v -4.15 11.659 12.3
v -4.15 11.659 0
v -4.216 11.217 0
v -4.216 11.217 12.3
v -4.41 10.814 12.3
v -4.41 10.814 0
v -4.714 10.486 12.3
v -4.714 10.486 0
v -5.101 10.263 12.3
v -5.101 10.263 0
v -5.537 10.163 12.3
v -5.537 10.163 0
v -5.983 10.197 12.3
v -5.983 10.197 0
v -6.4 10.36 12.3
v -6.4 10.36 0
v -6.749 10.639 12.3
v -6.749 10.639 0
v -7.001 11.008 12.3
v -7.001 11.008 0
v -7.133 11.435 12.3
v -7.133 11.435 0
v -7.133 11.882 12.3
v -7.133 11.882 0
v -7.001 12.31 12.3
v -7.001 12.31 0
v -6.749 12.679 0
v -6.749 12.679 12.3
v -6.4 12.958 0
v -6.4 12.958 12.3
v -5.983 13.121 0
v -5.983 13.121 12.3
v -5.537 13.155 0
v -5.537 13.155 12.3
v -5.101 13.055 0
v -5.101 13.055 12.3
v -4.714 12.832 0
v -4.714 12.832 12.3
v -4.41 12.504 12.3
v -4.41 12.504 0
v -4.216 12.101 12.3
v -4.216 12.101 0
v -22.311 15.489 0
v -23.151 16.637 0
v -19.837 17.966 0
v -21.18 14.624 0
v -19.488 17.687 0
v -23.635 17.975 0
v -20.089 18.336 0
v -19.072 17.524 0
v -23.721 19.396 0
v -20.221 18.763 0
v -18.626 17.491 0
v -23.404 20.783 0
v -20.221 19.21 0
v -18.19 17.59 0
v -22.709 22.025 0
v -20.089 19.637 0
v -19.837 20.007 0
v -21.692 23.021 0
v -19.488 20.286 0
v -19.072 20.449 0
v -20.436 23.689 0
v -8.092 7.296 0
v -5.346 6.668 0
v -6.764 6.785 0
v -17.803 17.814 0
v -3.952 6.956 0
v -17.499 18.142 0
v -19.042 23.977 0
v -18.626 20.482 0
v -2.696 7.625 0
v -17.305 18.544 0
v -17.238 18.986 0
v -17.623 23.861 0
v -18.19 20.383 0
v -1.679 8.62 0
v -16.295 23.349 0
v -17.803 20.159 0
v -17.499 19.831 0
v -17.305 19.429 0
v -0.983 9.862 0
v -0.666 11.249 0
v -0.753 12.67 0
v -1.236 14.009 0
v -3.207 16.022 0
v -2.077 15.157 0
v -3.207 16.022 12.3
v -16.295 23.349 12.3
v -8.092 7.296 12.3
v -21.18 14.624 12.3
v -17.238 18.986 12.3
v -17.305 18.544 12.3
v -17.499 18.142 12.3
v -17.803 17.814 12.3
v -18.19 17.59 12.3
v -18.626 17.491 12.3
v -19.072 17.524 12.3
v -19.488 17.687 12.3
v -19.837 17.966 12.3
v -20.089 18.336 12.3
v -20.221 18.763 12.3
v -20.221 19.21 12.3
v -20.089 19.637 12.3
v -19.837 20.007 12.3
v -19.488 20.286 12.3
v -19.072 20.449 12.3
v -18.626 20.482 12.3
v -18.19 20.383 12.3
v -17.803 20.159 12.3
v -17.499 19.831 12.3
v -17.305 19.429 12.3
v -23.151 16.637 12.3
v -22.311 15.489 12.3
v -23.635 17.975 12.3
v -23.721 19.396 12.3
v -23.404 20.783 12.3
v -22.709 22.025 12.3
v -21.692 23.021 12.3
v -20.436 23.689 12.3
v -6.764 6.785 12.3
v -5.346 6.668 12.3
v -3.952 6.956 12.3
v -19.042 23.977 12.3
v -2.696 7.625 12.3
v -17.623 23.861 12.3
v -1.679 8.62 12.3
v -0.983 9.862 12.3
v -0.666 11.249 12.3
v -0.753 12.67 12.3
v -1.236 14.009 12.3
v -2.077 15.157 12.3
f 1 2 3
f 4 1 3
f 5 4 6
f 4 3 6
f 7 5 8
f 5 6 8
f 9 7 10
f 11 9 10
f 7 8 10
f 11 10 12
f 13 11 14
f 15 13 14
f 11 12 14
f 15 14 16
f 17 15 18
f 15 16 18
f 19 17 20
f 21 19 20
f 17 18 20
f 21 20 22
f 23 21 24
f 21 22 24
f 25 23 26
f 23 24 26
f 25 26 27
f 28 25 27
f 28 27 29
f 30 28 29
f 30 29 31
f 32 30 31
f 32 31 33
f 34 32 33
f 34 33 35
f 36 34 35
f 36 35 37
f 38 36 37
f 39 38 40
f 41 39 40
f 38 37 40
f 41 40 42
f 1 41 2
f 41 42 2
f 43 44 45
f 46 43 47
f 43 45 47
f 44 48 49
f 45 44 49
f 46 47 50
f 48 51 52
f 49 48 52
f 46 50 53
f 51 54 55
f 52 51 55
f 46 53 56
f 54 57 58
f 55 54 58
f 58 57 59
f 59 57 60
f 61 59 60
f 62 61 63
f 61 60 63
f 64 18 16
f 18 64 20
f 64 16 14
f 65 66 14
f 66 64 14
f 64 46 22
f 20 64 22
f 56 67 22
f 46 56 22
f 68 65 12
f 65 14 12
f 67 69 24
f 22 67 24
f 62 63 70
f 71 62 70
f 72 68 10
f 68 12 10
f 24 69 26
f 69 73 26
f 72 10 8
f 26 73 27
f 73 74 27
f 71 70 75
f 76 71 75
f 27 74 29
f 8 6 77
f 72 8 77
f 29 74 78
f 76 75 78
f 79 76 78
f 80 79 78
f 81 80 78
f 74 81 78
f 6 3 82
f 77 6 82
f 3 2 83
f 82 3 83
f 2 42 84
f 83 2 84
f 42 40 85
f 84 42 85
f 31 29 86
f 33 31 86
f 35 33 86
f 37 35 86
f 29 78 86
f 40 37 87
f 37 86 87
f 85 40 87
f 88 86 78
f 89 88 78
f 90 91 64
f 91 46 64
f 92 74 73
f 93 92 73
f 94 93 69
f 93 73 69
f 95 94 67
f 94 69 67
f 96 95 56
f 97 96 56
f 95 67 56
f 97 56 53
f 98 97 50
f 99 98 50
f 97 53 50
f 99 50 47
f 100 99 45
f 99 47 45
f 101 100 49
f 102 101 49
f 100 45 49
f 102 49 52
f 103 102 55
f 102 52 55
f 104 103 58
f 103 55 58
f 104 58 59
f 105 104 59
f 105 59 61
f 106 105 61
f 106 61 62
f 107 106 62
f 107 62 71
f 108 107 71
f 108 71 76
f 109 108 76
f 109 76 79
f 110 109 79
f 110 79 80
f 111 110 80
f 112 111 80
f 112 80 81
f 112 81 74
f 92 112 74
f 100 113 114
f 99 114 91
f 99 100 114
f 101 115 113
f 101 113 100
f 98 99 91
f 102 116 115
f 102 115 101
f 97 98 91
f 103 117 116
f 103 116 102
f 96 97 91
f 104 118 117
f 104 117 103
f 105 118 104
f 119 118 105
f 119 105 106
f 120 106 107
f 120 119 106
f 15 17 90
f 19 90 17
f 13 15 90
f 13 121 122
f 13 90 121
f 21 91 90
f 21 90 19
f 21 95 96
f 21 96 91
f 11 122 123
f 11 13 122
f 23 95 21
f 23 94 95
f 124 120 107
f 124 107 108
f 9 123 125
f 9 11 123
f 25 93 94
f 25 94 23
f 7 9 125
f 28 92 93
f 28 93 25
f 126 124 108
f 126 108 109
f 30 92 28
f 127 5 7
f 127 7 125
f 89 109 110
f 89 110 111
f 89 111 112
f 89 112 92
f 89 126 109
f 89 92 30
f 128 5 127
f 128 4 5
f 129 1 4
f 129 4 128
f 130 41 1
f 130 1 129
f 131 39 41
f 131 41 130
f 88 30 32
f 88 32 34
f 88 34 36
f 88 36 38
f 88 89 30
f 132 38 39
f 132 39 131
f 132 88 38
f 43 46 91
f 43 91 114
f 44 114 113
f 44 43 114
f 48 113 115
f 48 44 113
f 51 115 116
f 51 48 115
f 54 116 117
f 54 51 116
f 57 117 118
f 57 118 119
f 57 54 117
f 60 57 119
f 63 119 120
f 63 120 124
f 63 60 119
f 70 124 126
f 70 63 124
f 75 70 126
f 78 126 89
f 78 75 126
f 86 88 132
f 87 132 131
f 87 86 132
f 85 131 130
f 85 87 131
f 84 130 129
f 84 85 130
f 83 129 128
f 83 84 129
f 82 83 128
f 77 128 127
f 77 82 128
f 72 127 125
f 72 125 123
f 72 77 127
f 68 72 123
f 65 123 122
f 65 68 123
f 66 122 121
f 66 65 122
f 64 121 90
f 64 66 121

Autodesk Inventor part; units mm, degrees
ref_plane "YZ Plane" through (0, 0, 0) normal (1, 0, 0) x (0, 1, 0)
ref_plane "XZ Plane" through (0, 0, 0) normal (0, 1, 0) x (-1, 0, 0)
sketch "Sketch1" plane through (0, 0, 0) normal (0, 0, 1) x (1, 0, 0)
  line L0 (86.516, -0.3214) -> (114.7595, -23.8164) projected
  arc A0 (113.4805, -27.354) -> (114.7595, -23.8164) centre (113.4805, -25.354) ccw projected
  line L1 (113.4805, -27.354) -> (84.3159, -27.354) projected
  arc A1 (80.4978, -22.1613) -> (84.3159, -27.354) centre (84.3159, -23.354) ccw projected
  arc A2 (80.4978, -22.1613) -> (83.238, -1.9261) centre (22.2724, -3.9734) ccw projected
  arc A3 (86.516, -0.3214) -> (83.238, -1.9261) centre (85.2369, -1.8589) ccw projected
  arc A4 (123.464, -37.945) -> (119.4703, -38.0751) centre (121.4642, -37.9192) ccw projected
  arc A5 (144.0129, -57.1973) -> (123.464, -37.945) centre (122.1805, -59.9075) ccw projected
  arc A6 (144.143, -61.191) -> (144.0129, -57.1973) centre (144.1688, -59.1912) ccw projected
  arc A7 (124.8907, -81.7399) -> (144.143, -61.191) centre (122.1805, -59.9075) ccw projected
  arc A8 (120.8969, -81.87) -> (124.8907, -81.7399) centre (122.8968, -81.8958) ccw projected
  arc A9 (100.3481, -62.6177) -> (120.8969, -81.87) centre (122.1805, -59.9075) ccw projected
  arc A10 (100.218, -58.6239) -> (100.3481, -62.6177) centre (100.1921, -60.6238) ccw projected
  arc A11 (119.4703, -38.0751) -> (100.218, -58.6239) centre (122.1805, -59.9075) ccw projected
  arc A12 (87.2274, -61.7195) -> (88.373, -68.9659) centre (122.1805, -59.9075) ccw projected
  arc A13 (85.8324, -71.3887) -> (88.373, -68.9659) centre (86.4412, -69.4836) ccw projected
  line L2 (85.8324, -71.3887) -> (52.5887, -60.766) projected
  arc A14 (52.2157, -57.1184) -> (52.5887, -60.766) centre (53.1975, -58.8609) ccw projected
  arc A15 (52.2157, -57.1184) -> (67.1926, -45.2429) centre (22.2724, -3.9734) ccw projected
  arc A16 (72.896, -45.0519) -> (67.1926, -45.2429) centre (70.1382, -47.9491) ccw projected
  line L3 (72.896, -45.0519) -> (84.7539, -56.3391) projected
  arc A17 (87.2274, -61.7195) -> (84.7539, -56.3391) centre (79.2381, -62.1337) ccw projected
  circle A18 centre (-5.6495, 11.6589) radius 2.05 projected
  circle A19 centre (-18.7379, 18.9865) radius 2.05 projected
  line L4 (2.166, 24.8708) -> (-5.7638, 34.6785) projected
  arc A20 (-5.0374, 39.0984) -> (-5.7638, 34.6785) centre (-3.431, 36.5647) ccw projected
  arc A21 (4.796, 43.9388) -> (-5.0374, 39.0984) centre (22.2724, -3.9734) ccw projected
  arc A22 (8.7012, 41.9703) -> (4.796, 43.9388) centre (5.8241, 41.1205) ccw projected
  line L5 (8.7012, 41.9703) -> (12.2517, 29.9506) projected
  arc A23 (10.4645, 26.3057) -> (12.2517, 29.9506) centre (9.3746, 29.1007) ccw projected
  arc A24 (10.4645, 26.3057) -> (6.0009, 24.16) centre (22.2724, -3.9734) ccw projected
  arc A25 (2.166, 24.8708) -> (6.0009, 24.16) centre (4.4989, 26.757) ccw projected
  line L6 (21.3733, 31.3882) -> (21.0547, 43.9173) projected
  arc A26 (24.1651, 46.9915) -> (21.0547, 43.9173) centre (24.0537, 43.9936) ccw projected
  arc A27 (35.0106, 45.4102) -> (24.1651, 46.9915) centre (22.2724, -3.9734) ccw projected
  arc A28 (37.0613, 41.4281) -> (35.0106, 45.4102) centre (34.2613, 42.5053) ccw projected
  line L7 (37.0613, 41.4281) -> (32.5324, 29.6567) projected
  arc A29 (29.1021, 27.8009) -> (32.5324, 29.6567) centre (29.7325, 30.7339) ccw projected
  arc A30 (29.1021, 27.8009) -> (24.1948, 28.4697) centre (22.2724, -3.9734) ccw projected
  arc A31 (21.3733, 31.3882) -> (24.1948, 28.4697) centre (24.3723, 31.4645) ccw projected
  line L8 (37.199, 27.8613) -> (41.7278, 39.6327) projected
  arc A32 (45.9187, 41.2135) -> (41.7278, 39.6327) centre (44.5277, 38.5555) ccw projected
  arc A33 (55.0274, 35.1177) -> (45.9187, 41.2135) centre (22.2724, -3.9734) ccw projected
  arc A34 (55.2752, 30.7515) -> (55.0274, 35.1177) centre (53.1006, 32.8182) ccw projected
  line L9 (55.2752, 30.7515) -> (46.641, 21.6668) projected
  arc A35 (42.5909, 21.3921) -> (46.641, 21.6668) centre (44.4665, 23.7336) ccw projected
  arc A36 (42.5909, 21.3921) -> (38.5009, 24.1849) centre (22.2724, -3.9734) ccw projected
  arc A37 (37.199, 27.8613) -> (38.5009, 24.1849) centre (39.9989, 26.7841) ccw projected
  line L10 (52.4469, 14.4861) -> (59.2911, 18.6731) projected
  arc A38 (63.5177, 17.4994) -> (59.2911, 18.6731) centre (60.8567, 16.114) ccw projected
  arc A39 (66.9215, 9.0155) -> (63.5177, 17.4994) centre (22.2724, -3.9734) ccw projected
  arc A40 (64.5079, 5.2141) -> (66.9215, 9.0155) centre (64.0409, 8.1775) ccw projected
  line L11 (64.5079, 5.2141) -> (56.5269, 3.9563) projected
  arc A41 (53.2046, 5.9991) -> (56.5269, 3.9563) centre (56.0599, 6.9197) ccw projected
  arc A42 (53.2046, 5.9991) -> (51.3302, 10.5833) centre (22.2724, -3.9734) ccw projected
  arc A43 (52.4469, 14.4861) -> (51.3302, 10.5833) centre (54.0124, 11.927) ccw projected
  line L12 (57.3053, -0.9828) -> (65.2864, 0.2751) projected
  arc A44 (68.7521, -2.5997) -> (65.2864, 0.2751) centre (65.7534, -2.6883) ccw projected
  arc A45 (68.1227, -11.7192) -> (68.7521, -2.5997) centre (22.2724, -3.9734) ccw projected
  arc A46 (64.4621, -14.1361) -> (68.1227, -11.7192) centre (65.1646, -11.2195) ccw projected
  line L13 (64.4621, -14.1361) -> (56.6618, -12.2571) projected
  arc A47 (54.3988, -8.887) -> (56.6618, -12.2571) centre (57.3643, -9.3405) ccw projected
  arc A48 (54.3988, -8.887) -> (54.7724, -3.9485) centre (22.2724, -3.9734) ccw projected
  arc A49 (57.3053, -0.9828) -> (54.7724, -3.9485) centre (57.7724, -3.9462) ccw projected
  line L14 (53.346, -20.8755) -> (64.3558, -26.8641) projected
  arc A50 (65.463, -31.0949) -> (64.3558, -26.8641) centre (62.9223, -29.4995) ccw projected
  arc A51 (58.6707, -39.6968) -> (65.463, -31.0949) centre (22.2724, -3.9734) ccw projected
  arc A52 (54.1968, -39.4816) -> (58.6707, -39.6968) centre (56.5296, -37.5954) ccw projected
  line L15 (54.1968, -39.4816) -> (46.2669, -29.6738) projected
  arc A53 (46.3749, -25.7752) -> (46.2669, -29.6738) centre (48.5998, -27.7876) ccw projected
  arc A54 (46.3749, -25.7752) -> (49.4077, -21.8598) centre (22.2724, -3.9734) ccw projected
  arc A55 (53.346, -20.8755) -> (49.4077, -21.8598) centre (51.9125, -23.5108) ccw projected
  line L16 (42.3788, -32.8175) -> (50.3087, -42.6252) projected
  arc A56 (49.5823, -47.0451) -> (50.3087, -42.6252) centre (47.9758, -44.5114) ccw projected
  arc A57 (39.7488, -51.8855) -> (49.5823, -47.0451) centre (22.2724, -3.9734) ccw projected
  arc A58 (35.8437, -49.917) -> (39.7488, -51.8855) centre (38.7208, -49.0672) ccw projected
  line L17 (35.8437, -49.917) -> (32.2932, -37.8973) projected
  arc A59 (34.0803, -34.2525) -> (32.2932, -37.8973) centre (35.1703, -37.0474) ccw projected
  arc A60 (34.0803, -34.2525) -> (38.5439, -32.1067) centre (22.2724, -3.9734) ccw projected
  arc A61 (42.3788, -32.8175) -> (38.5439, -32.1067) centre (40.0459, -34.7037) ccw projected
  line L18 (23.1715, -39.3349) -> (23.3755, -47.3558) projected
  arc A62 (20.2457, -50.4292) -> (23.3755, -47.3558) centre (20.3765, -47.432) ccw projected
  arc A63 (11.1966, -49.135) -> (20.2457, -50.4292) centre (22.2724, -3.9734) ccw projected
  arc A64 (9.1112, -45.1441) -> (11.1966, -49.135) centre (11.9112, -46.2214) ccw projected
  line L19 (9.1112, -45.1441) -> (12.0124, -37.6034) projected
  arc A65 (15.4428, -35.7477) -> (12.0124, -37.6034) centre (14.8123, -38.6807) ccw projected
  arc A66 (15.4428, -35.7477) -> (20.35, -36.4165) centre (22.2724, -3.9734) ccw projected
  arc A67 (23.1715, -39.3349) -> (20.35, -36.4165) centre (20.1725, -39.4112) ccw projected
  line L20 (7.3459, -35.8081) -> (4.4447, -43.3488) projected
  arc A68 (0.2222, -44.9128) -> (4.4447, -43.3488) centre (1.6448, -42.2715) ccw projected
  arc A69 (-7.3609, -39.808) -> (0.2222, -44.9128) centre (22.2724, -3.9734) ccw projected
  arc A70 (-7.6236, -35.4294) -> (-7.3609, -39.808) centre (-5.449, -37.4961) ccw projected
  line L21 (-7.6236, -35.4294) -> (-2.0962, -29.6136) projected
  arc A71 (1.9539, -29.3388) -> (-2.0962, -29.6136) centre (0.0783, -31.6803) ccw projected
  arc A72 (1.9539, -29.3388) -> (6.0439, -32.1316) centre (22.2724, -3.9734) ccw projected
  arc A73 (7.3459, -35.8081) -> (6.0439, -32.1316) centre (4.5459, -34.7308) ccw projected
  line L22 (-7.9021, -22.4328) -> (-18.5933, -28.9733) projected
  arc A74 (-22.8108, -27.8167) -> (-18.5933, -28.9733) centre (-20.1588, -26.4142) ccw projected
  arc A75 (-26.8641, -17.6335) -> (-22.8108, -27.8167) centre (22.2724, -3.9734) ccw projected
  arc A76 (-24.4408, -13.8666) -> (-26.8641, -17.6335) centre (-23.9738, -16.83) ccw projected
  line L23 (-24.4408, -13.8666) -> (-11.9821, -11.903) projected
  arc A77 (-8.6598, -13.9459) -> (-11.9821, -11.903) centre (-11.515, -14.8664) ccw projected
  arc A78 (-8.6598, -13.9459) -> (-6.7854, -18.53) centre (22.2724, -3.9734) ccw projected
  arc A79 (-7.9021, -22.4328) -> (-6.7854, -18.53) centre (-9.4676, -19.8737) ccw projected
  line L24 (-12.7605, -6.9639) -> (-25.2192, -8.9275) projected
  arc A80 (-28.6837, -6.0885) -> (-25.2192, -8.9275) centre (-25.6863, -5.9641) ccw projected
  arc A81 (-27.9589, 4.8477) -> (-28.6837, -6.0885) centre (22.2724, -3.9734) ccw projected
  arc A82 (-24.3016, 7.2454) -> (-27.9589, 4.8477) centre (-25.0042, 4.3289) ccw projected
  line L25 (-24.3016, 7.2454) -> (-12.117, 4.3104) projected
  arc A83 (-9.854, 0.9403) -> (-12.117, 4.3104) centre (-12.8195, 1.3938) ccw projected
  arc A84 (-9.854, 0.9403) -> (-10.2276, -3.9982) centre (22.2724, -3.9734) ccw projected
  arc A85 (-12.7605, -6.9639) -> (-10.2276, -3.9982) centre (-13.2276, -4.0005) ccw projected
  circle A86 centre (85.7696, -48.6911) radius 2.05 projected
  circle A87 centre (93.5857, -34.7301) radius 2.05 projected
  circle A88 centre (76.5892, -34.383) radius 2.05 projected
  circle A89 centre (151.7223, -75.704) radius 1.5 projected
  circle A90 centre (150.6316, -42.2218) radius 1.5 projected
  circle A91 centre (123.2712, -93.3897) radius 1.5 projected
  circle A92 centre (123.1684, -22.4726) radius 2 projected
  circle A93 centre (91.7471, -81.3441) radius 2 projected
  circle A94 centre (110.6431, -14.2192) radius 2 projected
  circle A95 centre (78.0027, -75.3364) radius 2 projected
  arc A96 (-41.3146, 7.2953) -> (-36.3695, 11.8712) centre (-78.5082, 52.4493) ccw projected
  arc A97 (-32.9898, 9.9939) -> (-36.3695, 11.8712) centre (-34.9289, 10.4839) ccw projected
  arc A98 (-32.9898, 9.9939) -> (-34.2864, 3.1052) centre (22.2724, -3.9734) ccw projected
  arc A99 (-37.576, 1.8381) -> (-34.2864, 3.1052) centre (-36.2709, 3.3536) ccw projected
  arc A100 (-37.576, 1.8381) -> (-40.8614, 3.9267) centre (-46.3856, -8.3913) ccw projected
  arc A101 (-41.3146, 7.2953) -> (-40.8614, 3.9267) centre (-40.043, 5.7516) ccw projected
  arc A102 (-33.319, -18.6649) -> (-28.8077, -30.3754) centre (22.2724, -3.9734) ccw projected
  arc A103 (-31.7455, -32.9222) -> (-28.8077, -30.3754) centre (-30.5844, -31.2938) ccw projected
  line L26 (-31.7455, -32.9222) -> (-43.0588, -24.8558) projected
  arc A104 (-42.4768, -21.313) -> (-43.0588, -24.8558) centre (-41.8977, -23.2274) ccw projected
  arc A105 (-42.4768, -21.313) -> (-36.6892, -17.7843) centre (-46.3856, -8.3913) ccw projected
  arc A106 (-33.319, -18.6649) -> (-36.6892, -17.7843) centre (-35.2527, -19.1759) ccw projected
  line L27 (-64.993, -11.6723) -> (-61.5225, -11.0604) projected
  arc A107 (-59.2669, -12.4314) -> (-61.5225, -11.0604) centre (-61.1752, -13.03) ccw projected
  arc A108 (-59.2669, -12.4314) -> (-52.6012, -20.3753) centre (-46.3856, -8.3913) ccw projected
  arc A109 (-51.6426, -22.8348) -> (-52.6012, -20.3753) centre (-53.522, -22.1507) ccw projected
  line L28 (-51.6426, -22.8348) -> (-52.8479, -26.1463) projected
  arc A110 (-55.6053, -27.2592) -> (-52.8479, -26.1463) centre (-54.7273, -25.4622) ccw projected
  arc A111 (-66.5678, -14.1946) -> (-55.6053, -27.2592) centre (-46.3856, -8.3913) ccw projected
  arc A112 (-64.993, -11.6723) -> (-66.5678, -14.1946) centre (-64.6457, -13.6419) ccw projected
  circle A113 centre (-48.56, 6.9152) radius 2.1 projected
  circle A114 centre (-32.9741, 22.501) radius 2.1 projected
  circle A115 centre (-69.0444, -1.2227) radius 2.1 projected
  circle A116 centre (-24.8362, 42.9855) radius 2.1 projected
  circle A117 centre (-46.3856, -8.3913) radius 8 projected
  line L29 (-28.6687, 48.4472) -> (-17.4995, 54.7179) projected
  arc A118 (-69.8258, 3.2089) -> (-28.6687, 48.4472) centre (-78.5082, 52.4493) ccw projected
  line L30 (-69.8258, 3.2089) -> (-78.128, 1.745) projected
  line L31 (-78.128, 1.745) -> (-74.0482, -21.3924) projected
  line L32 (-74.0482, -21.3924) -> (-71.8042, -20.9967) projected
  arc A119 (-69.7278, -21.9611) -> (-71.8042, -20.9967) centre (-71.4569, -22.9663) ccw projected
  arc A120 (-69.7278, -21.9611) -> (-51.1536, -34.967) centre (-46.3856, -8.3913) ccw projected
  arc A121 (-49.5371, -36.5883) -> (-51.1536, -34.967) centre (-51.5067, -36.9355) ccw projected
  line L33 (-49.5371, -36.5883) -> (-49.1414, -38.8323) projected
  line L34 (-49.1414, -38.8323) -> (-41.7759, -37.5336) projected
  arc A122 (-40.7711, -37.6143) -> (-41.7759, -37.5336) centre (-41.4286, -39.5032) ccw projected
  line L35 (-40.7711, -37.6143) -> (2.4006, -52.6404) projected
  arc A123 (3.6226, -55.2133) -> (2.4006, -52.6404) centre (1.7432, -54.5293) ccw projected
  line L36 (3.6226, -55.2133) -> (1.8974, -59.9532) projected
  line L37 (1.8974, -59.9532) -> (17.5702, -63.2237) projected
  line L38 (17.5702, -63.2237) -> (111.5272, -93.2468) projected
  arc A124 (111.5272, -93.2468) -> (114.3001, -94.0088) centre (122.1805, -59.9075) ccw projected
  arc A125 (115.8487, -95.8923) -> (114.3001, -94.0088) centre (113.8498, -95.9574) ccw projected
  line L39 (115.8487, -95.8923) -> (115.9054, -97.6318) projected
  line L40 (115.9054, -97.6318) -> (130.8974, -97.1434) projected
  line L41 (130.8974, -97.1434) -> (130.8408, -95.404) projected
  arc A126 (132.2635, -93.4236) -> (130.8408, -95.404) centre (132.8397, -95.3388) ccw projected
  arc A127 (132.2635, -93.4236) -> (147.7729, -83.7828) centre (122.1805, -59.9075) ccw projected
  arc A128 (150.1784, -83.3834) -> (147.7729, -83.7828) centre (149.2353, -85.1471) ccw projected
  line L42 (150.1784, -83.3834) -> (151.7131, -84.204) projected
  line L43 (151.7131, -84.204) -> (158.7862, -70.9764) projected
  line L44 (158.7862, -70.9764) -> (157.2515, -70.1557) projected
  arc A129 (156.2478, -67.9334) -> (157.2515, -70.1557) centre (158.1945, -68.392) ccw projected
  arc A130 (156.2478, -67.9334) -> (155.6533, -49.6815) centre (122.1805, -59.9075) ccw projected
  arc A131 (156.5102, -47.3985) -> (155.6533, -49.6815) centre (157.566, -49.0971) ccw projected
  line L45 (156.5102, -47.3985) -> (157.9882, -46.4797) projected
  line L46 (157.9882, -46.4797) -> (150.0693, -33.7404) projected
  line L47 (150.0693, -33.7404) -> (148.5912, -34.6592) projected
  arc A132 (146.1648, -34.4172) -> (148.5912, -34.6592) centre (147.5353, -32.9607) ccw projected
  arc A133 (146.1648, -34.4172) -> (144.5637, -33.0004) centre (122.1805, -59.9075) ccw projected
  line L48 (144.5637, -33.0004) -> (73.8637, 25.8129) projected
  line L49 (73.8637, 25.8129) -> (63.9599, 38.3925) projected
  arc A134 (63.9599, 38.3925) -> (60.1088, 41.8646) centre (22.2724, -3.9734) ccw projected
  line L50 (60.1088, 41.8646) -> (59.4908, 41.1159) projected
  arc A135 (56.7287, 40.804) -> (59.4908, 41.1159) centre (57.9484, 42.389) ccw projected
  arc A136 (56.7287, 40.804) -> (49.4201, 45.5771) centre (22.2724, -3.9734) ccw projected
  arc A137 (48.5953, 48.2316) -> (49.4201, 45.5771) centre (50.3811, 47.3311) ccw projected
  line L51 (48.5953, 48.2316) -> (49.1968, 49.4245) projected
  arc A138 (49.1968, 49.4245) -> (43.4677, 51.9463) centre (22.2724, -3.9734) ccw projected
  line L52 (43.4677, 51.9463) -> (31.8766, 55.0521) projected
  arc A139 (31.8766, 55.0521) -> (25.6541, 55.7327) centre (22.2724, -3.9734) ccw projected
  line L53 (25.6541, 55.7327) -> (25.5786, 54.3989) projected
  arc A140 (23.537, 52.5125) -> (25.5786, 54.3989) centre (23.5818, 54.512) ccw projected
  arc A141 (23.537, 52.5125) -> (14.821, 52.0331) centre (22.2724, -3.9734) ccw projected
  arc A142 (12.5849, 53.6843) -> (14.821, 52.0331) centre (14.5573, 54.0157) ccw projected
  line L54 (12.5849, 53.6843) -> (12.4241, 54.6417) projected
  arc A143 (12.4241, 54.6417) -> (7.3529, 53.5603) centre (22.2724, -3.9734) ccw projected
  line L55 (7.3529, 53.5603) -> (-6.5013, 48.0227) projected
  arc A144 (-8.4026, 48.2499) -> (-6.5013, 48.0227) centre (-7.2436, 49.8798) ccw projected
  line L56 (-8.4026, 48.2499) -> (-17.4995, 54.7179) projected
  circle A145 centre (-71.296, -16.8454) radius 1.5 projected
  circle A146 centre (18.8152, -59.8032) radius 1.5 projected
  circle A147 centre (53.4562, -50.8504) radius 1.5 projected
  circle A148 centre (60.8075, 36.5725) radius 1.5 projected
  circle A149 centre (28.5162, 51.9811) radius 1.5 projected
  circle A150 centre (9.173, 50.4079) radius 1.5 projected
  circle A151 centre (44.8423, 47.6065) radius 1.5 projected
  circle A152 centre (67.2628, -37.2117) radius 1.5 projected
  circle A153 centre (38.1378, -57.9935) radius 1.5 projected
  circle A154 centre (-45.81, -34.6909) radius 1.5 projected
  circle A155 centre (22.2724, -3.9734) radius 24.5 projected
  line L57 (-5.6495, 11.6589) -> (-18.7379, 18.9865) construction
  line L58 (-3.6955, 15.1491) -> (-16.7839, 22.4767)
  line L59 (-20.6919, 15.4963) -> (-7.6035, 8.1686)
  arc A156 (-7.6035, 8.1686) -> (-3.6955, 15.1491) centre (-5.6495, 11.6589) ccw
  arc A157 (-16.7839, 22.4767) -> (-20.6919, 15.4963) centre (-18.7379, 18.9865) ccw
  circle A158 centre (-5.6495, 11.6589) radius 1.5
  circle A159 centre (-18.7379, 18.9865) radius 1.5
  point P0 (0, 0)
  point P1 (-12.1937, 15.3227)
  dimension "d0" = 8
  dimension "d1" = 3
  dimension "d2" = 3
ref_plane "Work Plane1" through (82.5607, -52.1105, 12.3) normal (0, 0, 1) x (0.9725249, 0.2327991, 0)
extrude "Extrusion1" add sketch "Sketch1" along normal up to surface (12.3 mm away) contours A18 | A19 | A156 L59 A157 L58
thicken "Thicken1" operation add thickness 1 both sides no extend neighbours yes toward (-0.4885077, -0.8725596, 0) faces at (-16.3291, 13.0537, 8.2)
properties part number "leg_fixer_2"
